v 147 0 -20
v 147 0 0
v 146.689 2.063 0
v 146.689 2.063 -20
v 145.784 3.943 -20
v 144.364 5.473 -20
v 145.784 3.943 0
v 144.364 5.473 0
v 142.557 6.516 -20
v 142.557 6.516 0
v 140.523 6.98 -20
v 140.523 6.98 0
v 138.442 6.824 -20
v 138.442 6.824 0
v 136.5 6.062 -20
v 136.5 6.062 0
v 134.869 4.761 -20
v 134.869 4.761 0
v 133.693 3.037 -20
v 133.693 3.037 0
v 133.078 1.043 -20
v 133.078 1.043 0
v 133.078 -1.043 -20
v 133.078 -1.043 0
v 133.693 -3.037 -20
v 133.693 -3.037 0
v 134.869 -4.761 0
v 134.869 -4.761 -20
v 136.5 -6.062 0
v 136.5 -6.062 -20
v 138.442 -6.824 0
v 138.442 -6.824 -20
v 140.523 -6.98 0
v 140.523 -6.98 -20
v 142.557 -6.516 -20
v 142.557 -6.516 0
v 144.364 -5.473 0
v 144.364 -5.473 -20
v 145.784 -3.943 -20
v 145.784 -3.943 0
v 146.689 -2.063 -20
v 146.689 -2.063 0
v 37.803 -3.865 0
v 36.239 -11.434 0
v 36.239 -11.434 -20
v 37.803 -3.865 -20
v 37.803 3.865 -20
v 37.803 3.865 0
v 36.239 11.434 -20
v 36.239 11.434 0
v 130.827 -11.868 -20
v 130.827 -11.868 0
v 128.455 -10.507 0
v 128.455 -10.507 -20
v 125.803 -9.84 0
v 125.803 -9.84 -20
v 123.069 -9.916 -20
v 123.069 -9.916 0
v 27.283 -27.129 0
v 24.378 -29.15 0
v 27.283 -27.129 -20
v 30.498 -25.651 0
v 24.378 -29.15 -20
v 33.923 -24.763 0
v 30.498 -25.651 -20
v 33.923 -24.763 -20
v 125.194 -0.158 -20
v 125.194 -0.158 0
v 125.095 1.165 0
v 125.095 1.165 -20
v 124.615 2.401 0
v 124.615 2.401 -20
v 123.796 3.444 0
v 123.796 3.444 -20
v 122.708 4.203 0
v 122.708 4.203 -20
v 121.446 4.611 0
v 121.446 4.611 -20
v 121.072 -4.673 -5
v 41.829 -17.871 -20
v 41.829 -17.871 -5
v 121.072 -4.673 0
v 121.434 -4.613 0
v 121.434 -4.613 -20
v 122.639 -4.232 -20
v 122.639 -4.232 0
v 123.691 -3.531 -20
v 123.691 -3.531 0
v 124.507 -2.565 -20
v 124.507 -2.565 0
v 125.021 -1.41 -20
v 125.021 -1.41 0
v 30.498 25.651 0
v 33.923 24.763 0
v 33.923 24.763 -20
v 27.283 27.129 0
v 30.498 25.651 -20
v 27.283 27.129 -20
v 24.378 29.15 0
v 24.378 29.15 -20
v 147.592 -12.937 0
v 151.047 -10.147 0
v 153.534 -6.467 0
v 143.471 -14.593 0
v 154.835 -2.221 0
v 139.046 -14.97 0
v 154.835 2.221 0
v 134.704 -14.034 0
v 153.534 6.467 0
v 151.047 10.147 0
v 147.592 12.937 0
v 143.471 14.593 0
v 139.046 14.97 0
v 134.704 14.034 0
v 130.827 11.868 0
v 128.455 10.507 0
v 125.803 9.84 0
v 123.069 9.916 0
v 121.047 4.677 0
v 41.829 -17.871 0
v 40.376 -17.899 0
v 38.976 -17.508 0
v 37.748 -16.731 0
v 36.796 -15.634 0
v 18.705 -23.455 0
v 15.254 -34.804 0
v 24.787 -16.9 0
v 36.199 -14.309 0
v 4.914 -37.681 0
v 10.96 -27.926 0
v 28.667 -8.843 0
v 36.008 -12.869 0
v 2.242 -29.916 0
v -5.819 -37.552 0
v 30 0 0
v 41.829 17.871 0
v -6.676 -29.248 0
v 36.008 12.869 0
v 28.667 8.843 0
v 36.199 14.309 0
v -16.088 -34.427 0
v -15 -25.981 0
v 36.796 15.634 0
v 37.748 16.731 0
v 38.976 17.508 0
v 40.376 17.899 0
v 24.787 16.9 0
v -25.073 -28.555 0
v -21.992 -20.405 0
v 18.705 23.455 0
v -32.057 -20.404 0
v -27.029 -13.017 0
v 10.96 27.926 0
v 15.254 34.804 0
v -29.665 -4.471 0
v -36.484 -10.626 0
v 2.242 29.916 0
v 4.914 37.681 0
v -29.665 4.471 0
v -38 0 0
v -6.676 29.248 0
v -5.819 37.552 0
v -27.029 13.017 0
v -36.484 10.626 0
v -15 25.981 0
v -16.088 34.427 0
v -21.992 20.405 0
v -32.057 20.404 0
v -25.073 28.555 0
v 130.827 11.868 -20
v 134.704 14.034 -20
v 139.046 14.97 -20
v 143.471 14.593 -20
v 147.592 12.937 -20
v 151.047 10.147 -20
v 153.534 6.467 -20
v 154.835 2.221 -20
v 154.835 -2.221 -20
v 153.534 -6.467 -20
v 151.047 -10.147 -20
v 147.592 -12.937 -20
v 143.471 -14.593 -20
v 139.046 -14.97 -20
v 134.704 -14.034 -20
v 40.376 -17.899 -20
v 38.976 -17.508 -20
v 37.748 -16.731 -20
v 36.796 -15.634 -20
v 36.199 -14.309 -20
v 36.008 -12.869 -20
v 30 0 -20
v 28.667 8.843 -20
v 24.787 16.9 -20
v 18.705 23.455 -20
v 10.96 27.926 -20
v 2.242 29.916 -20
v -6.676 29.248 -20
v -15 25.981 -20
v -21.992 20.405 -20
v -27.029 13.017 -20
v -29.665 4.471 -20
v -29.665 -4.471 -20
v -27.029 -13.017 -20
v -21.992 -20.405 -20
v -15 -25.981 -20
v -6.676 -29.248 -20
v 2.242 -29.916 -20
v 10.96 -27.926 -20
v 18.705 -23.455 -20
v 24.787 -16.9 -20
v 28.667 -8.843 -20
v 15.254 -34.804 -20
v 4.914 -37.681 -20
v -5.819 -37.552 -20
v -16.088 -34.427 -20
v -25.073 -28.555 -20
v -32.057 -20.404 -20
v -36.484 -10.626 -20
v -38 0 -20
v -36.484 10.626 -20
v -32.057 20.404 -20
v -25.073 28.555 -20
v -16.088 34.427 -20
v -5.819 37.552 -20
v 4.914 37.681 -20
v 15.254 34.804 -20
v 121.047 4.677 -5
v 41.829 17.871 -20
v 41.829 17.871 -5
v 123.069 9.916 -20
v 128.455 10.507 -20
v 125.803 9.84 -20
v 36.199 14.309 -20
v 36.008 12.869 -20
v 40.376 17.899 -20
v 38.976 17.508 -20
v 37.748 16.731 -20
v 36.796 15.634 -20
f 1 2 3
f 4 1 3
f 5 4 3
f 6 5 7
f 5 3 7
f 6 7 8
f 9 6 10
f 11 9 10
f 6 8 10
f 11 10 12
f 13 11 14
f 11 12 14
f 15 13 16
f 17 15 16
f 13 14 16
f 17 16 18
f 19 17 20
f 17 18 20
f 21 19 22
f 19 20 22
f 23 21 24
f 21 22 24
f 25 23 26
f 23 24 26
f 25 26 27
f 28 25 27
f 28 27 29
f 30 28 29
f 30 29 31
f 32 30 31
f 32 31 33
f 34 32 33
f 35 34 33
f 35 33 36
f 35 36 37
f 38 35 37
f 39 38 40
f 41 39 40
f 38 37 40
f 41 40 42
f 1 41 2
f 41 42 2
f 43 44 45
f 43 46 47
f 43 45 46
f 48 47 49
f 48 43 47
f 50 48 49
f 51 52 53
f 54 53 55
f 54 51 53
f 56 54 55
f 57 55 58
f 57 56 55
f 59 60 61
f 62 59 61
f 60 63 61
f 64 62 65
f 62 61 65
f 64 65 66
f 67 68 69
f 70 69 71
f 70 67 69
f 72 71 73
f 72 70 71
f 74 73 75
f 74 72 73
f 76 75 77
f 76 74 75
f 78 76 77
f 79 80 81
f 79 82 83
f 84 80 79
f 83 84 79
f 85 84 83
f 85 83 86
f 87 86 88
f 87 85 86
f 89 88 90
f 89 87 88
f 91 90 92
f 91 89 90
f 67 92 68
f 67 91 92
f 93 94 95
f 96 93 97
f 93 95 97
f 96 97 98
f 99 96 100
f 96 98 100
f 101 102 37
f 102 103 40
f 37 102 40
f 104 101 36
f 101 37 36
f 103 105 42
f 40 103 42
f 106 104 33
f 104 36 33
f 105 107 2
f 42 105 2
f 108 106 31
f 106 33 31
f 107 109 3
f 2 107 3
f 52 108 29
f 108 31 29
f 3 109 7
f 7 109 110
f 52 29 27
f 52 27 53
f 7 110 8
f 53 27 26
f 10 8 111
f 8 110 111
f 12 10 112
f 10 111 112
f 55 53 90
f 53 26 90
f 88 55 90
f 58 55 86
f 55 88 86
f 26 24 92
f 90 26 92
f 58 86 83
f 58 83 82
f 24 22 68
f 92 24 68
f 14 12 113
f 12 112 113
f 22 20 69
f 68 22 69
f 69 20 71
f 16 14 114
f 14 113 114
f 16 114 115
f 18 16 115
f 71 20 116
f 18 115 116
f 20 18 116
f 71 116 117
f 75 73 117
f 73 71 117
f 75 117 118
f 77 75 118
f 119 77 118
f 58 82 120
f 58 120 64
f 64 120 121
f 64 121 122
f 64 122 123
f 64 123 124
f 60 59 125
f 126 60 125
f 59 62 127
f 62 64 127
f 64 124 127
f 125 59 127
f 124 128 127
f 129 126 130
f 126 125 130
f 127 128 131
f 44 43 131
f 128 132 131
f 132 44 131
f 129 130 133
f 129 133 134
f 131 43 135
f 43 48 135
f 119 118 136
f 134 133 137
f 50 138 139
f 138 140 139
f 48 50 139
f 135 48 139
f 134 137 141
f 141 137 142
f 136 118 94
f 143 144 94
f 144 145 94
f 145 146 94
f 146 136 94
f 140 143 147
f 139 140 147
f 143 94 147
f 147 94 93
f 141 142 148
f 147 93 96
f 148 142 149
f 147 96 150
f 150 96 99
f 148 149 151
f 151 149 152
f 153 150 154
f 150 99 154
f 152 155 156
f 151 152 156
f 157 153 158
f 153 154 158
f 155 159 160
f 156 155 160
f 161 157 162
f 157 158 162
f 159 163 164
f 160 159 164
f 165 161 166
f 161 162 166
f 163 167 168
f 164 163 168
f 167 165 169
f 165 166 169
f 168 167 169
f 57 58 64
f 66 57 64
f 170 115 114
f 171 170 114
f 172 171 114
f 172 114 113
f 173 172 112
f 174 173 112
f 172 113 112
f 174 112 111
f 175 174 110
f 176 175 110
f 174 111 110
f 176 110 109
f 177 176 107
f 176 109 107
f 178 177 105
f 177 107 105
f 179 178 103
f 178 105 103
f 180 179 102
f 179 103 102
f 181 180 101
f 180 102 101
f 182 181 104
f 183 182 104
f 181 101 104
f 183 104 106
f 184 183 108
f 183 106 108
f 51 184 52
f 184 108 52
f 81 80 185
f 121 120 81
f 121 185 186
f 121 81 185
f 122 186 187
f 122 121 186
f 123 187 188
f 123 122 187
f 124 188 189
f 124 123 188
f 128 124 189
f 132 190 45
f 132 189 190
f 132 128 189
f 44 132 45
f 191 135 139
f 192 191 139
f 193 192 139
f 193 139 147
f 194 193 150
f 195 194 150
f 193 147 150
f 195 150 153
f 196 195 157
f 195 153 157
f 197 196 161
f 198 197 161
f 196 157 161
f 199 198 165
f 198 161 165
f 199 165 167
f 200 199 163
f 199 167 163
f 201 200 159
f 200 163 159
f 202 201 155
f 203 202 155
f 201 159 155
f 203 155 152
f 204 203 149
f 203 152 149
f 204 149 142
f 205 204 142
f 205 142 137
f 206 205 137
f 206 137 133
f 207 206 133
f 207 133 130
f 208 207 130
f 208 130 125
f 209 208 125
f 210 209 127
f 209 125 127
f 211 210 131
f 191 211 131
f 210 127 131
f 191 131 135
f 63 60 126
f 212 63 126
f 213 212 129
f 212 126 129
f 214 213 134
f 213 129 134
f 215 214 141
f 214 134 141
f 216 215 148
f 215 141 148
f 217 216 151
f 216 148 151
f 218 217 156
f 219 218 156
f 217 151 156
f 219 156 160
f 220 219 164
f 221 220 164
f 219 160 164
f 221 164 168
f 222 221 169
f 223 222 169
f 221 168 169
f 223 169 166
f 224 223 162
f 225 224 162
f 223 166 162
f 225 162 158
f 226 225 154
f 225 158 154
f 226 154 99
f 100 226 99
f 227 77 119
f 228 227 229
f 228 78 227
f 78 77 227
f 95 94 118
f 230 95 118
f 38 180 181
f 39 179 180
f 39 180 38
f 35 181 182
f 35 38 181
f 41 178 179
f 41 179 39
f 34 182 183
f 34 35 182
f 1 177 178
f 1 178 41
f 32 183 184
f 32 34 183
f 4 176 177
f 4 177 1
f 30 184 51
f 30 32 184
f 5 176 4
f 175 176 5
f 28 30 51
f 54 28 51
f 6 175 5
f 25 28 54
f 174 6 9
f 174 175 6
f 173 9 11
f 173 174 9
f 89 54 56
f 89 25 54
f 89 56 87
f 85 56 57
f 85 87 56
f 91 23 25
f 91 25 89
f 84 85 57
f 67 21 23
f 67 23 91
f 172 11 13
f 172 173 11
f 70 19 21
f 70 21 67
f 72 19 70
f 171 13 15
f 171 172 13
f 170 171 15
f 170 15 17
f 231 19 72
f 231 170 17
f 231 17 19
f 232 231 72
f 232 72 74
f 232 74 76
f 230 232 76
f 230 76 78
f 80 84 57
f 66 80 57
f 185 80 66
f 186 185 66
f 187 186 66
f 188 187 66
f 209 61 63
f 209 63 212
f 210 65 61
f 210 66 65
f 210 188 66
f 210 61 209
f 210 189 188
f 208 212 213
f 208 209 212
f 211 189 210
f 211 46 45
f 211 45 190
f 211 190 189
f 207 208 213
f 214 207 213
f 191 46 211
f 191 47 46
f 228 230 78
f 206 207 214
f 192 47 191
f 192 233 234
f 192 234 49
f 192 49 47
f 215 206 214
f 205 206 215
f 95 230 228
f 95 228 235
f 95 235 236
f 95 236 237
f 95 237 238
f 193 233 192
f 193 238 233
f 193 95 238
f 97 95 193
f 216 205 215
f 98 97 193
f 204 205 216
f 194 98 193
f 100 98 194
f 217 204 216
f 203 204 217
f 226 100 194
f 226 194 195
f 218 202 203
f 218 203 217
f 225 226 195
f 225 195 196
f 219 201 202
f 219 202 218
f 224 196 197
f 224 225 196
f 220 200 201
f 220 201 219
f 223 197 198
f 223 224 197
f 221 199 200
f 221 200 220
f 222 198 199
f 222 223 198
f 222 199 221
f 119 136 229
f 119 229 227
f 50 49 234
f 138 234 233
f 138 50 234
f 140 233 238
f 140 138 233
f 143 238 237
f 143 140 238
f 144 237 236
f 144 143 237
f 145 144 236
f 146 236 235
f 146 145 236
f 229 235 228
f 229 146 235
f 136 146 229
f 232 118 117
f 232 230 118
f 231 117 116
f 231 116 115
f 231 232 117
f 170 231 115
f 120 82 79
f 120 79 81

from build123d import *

# Parameters (mm, degrees)
SKETCH1_R          = 30
SKETCH1_R_2        = 7
BASE_EXTRUDE_DEPTH = 20
FILLET1_R          = 10
FILLET2_R          = 20
CUT_EXTRUDE1_DEPTH = 5
CUT_EXTRUDE2_DEPTH = 21


with BuildPart() as part:
    # Sketch1 → Base-Extrude (new body)
    with BuildSketch(Plane.XY):
        with BuildLine():
            Line((27.935473676, 25.760615491), (128.063755469, 9.084385863))
            ThreePointArc((128.063755469, 9.084385863), (155, 0), (128.063755469, -9.084385863))
            Line((128.063755469, -9.084385863), (27.935473676, -25.760615491))
            ThreePointArc((27.935473676, -25.760615491), (-38, 0), (27.935473676, 25.760615491))
        make_face()
        Circle(SKETCH1_R, mode=Mode.SUBTRACT)
        with Locations((140, 0)):
            Circle(SKETCH1_R_2, mode=Mode.SUBTRACT)
    extrude(amount=-BASE_EXTRUDE_DEPTH)

    # Fillet1
    fillet1_edges = [part.edges().sort_by_distance(p)[0] for p in [
        (128.063755469, 9.084385863, -10),
        (128.063755469, -9.084385863, -10),
    ]]
    fillet(fillet1_edges, radius=FILLET1_R)

    # Fillet2
    fillet2_edges = [part.edges().sort_by_distance(p)[0] for p in [
        (27.935473676, 25.760615491, -10),
        (27.935473676, -25.760615491, -10),
    ]]
    fillet(fillet2_edges, radius=FILLET2_R)

    # Sketch2 → Cut-Extrude1 (cut)
    with BuildSketch(Plane.XY):
        with BuildLine():
            Line((41.828554558, 17.870982725), (121.046940728, 4.677267873))
            ThreePointArc((121.046940728, 4.677267873), (123.741079282, 3.147292859), (124.807655013, 0.238406077))
            ThreePointArc((124.807655013, 0.238406077), (123.914202634, -2.958553332), (121.071833732, -4.673121977))
            Line((121.071833732, -4.673121977), (41.828554558, -17.870982725))
            ThreePointArc((41.828554558, -17.870982725), (37.231968897, -16.217361812), (36.238855523, -11.43439331))
            ThreePointArc((36.238855523, -11.43439331), (38, 0), (36.238855523, 11.43439331))
            ThreePointArc((36.238855523, 11.43439331), (37.231968897, 16.217361812), (41.828554558, 17.870982725))
        make_face()
    extrude(amount=-CUT_EXTRUDE1_DEPTH, mode=Mode.SUBTRACT)

    # Sketch3 → Cut-Extrude2 (cut, through all)
    with BuildSketch(Plane(origin=(0, 0, -20), x_dir=(-1, 0, 0), z_dir=(0, 0, -1))):
        with BuildLine():
            Line((-121.445609231, 4.610870174), (-41.828554558, 17.870982725))
            ThreePointArc((-41.828554558, 17.870982725), (-37.231968897, 16.217361812), (-36.238855523, 11.43439331))
            ThreePointArc((-36.238855523, 11.43439331), (-38, 0), (-36.238855523, -11.43439331))
            ThreePointArc((-36.238855523, -11.43439331), (-37.231968897, -16.217361812), (-41.828554558, -17.870982725))
            Line((-41.828554558, -17.870982725), (-121.433526351, -4.612882562))
            ThreePointArc((-121.433526351, -4.612882562), (-124.132861899, -3.076762276), (-125.194211834, -0.157924451))
            ThreePointArc((-125.194211834, -0.157924451), (-124.244145959, 2.952985869), (-121.445609231, 4.610870174))
        make_face()
    extrude(amount=-CUT_EXTRUDE2_DEPTH, mode=Mode.SUBTRACT)


solid = part.part
